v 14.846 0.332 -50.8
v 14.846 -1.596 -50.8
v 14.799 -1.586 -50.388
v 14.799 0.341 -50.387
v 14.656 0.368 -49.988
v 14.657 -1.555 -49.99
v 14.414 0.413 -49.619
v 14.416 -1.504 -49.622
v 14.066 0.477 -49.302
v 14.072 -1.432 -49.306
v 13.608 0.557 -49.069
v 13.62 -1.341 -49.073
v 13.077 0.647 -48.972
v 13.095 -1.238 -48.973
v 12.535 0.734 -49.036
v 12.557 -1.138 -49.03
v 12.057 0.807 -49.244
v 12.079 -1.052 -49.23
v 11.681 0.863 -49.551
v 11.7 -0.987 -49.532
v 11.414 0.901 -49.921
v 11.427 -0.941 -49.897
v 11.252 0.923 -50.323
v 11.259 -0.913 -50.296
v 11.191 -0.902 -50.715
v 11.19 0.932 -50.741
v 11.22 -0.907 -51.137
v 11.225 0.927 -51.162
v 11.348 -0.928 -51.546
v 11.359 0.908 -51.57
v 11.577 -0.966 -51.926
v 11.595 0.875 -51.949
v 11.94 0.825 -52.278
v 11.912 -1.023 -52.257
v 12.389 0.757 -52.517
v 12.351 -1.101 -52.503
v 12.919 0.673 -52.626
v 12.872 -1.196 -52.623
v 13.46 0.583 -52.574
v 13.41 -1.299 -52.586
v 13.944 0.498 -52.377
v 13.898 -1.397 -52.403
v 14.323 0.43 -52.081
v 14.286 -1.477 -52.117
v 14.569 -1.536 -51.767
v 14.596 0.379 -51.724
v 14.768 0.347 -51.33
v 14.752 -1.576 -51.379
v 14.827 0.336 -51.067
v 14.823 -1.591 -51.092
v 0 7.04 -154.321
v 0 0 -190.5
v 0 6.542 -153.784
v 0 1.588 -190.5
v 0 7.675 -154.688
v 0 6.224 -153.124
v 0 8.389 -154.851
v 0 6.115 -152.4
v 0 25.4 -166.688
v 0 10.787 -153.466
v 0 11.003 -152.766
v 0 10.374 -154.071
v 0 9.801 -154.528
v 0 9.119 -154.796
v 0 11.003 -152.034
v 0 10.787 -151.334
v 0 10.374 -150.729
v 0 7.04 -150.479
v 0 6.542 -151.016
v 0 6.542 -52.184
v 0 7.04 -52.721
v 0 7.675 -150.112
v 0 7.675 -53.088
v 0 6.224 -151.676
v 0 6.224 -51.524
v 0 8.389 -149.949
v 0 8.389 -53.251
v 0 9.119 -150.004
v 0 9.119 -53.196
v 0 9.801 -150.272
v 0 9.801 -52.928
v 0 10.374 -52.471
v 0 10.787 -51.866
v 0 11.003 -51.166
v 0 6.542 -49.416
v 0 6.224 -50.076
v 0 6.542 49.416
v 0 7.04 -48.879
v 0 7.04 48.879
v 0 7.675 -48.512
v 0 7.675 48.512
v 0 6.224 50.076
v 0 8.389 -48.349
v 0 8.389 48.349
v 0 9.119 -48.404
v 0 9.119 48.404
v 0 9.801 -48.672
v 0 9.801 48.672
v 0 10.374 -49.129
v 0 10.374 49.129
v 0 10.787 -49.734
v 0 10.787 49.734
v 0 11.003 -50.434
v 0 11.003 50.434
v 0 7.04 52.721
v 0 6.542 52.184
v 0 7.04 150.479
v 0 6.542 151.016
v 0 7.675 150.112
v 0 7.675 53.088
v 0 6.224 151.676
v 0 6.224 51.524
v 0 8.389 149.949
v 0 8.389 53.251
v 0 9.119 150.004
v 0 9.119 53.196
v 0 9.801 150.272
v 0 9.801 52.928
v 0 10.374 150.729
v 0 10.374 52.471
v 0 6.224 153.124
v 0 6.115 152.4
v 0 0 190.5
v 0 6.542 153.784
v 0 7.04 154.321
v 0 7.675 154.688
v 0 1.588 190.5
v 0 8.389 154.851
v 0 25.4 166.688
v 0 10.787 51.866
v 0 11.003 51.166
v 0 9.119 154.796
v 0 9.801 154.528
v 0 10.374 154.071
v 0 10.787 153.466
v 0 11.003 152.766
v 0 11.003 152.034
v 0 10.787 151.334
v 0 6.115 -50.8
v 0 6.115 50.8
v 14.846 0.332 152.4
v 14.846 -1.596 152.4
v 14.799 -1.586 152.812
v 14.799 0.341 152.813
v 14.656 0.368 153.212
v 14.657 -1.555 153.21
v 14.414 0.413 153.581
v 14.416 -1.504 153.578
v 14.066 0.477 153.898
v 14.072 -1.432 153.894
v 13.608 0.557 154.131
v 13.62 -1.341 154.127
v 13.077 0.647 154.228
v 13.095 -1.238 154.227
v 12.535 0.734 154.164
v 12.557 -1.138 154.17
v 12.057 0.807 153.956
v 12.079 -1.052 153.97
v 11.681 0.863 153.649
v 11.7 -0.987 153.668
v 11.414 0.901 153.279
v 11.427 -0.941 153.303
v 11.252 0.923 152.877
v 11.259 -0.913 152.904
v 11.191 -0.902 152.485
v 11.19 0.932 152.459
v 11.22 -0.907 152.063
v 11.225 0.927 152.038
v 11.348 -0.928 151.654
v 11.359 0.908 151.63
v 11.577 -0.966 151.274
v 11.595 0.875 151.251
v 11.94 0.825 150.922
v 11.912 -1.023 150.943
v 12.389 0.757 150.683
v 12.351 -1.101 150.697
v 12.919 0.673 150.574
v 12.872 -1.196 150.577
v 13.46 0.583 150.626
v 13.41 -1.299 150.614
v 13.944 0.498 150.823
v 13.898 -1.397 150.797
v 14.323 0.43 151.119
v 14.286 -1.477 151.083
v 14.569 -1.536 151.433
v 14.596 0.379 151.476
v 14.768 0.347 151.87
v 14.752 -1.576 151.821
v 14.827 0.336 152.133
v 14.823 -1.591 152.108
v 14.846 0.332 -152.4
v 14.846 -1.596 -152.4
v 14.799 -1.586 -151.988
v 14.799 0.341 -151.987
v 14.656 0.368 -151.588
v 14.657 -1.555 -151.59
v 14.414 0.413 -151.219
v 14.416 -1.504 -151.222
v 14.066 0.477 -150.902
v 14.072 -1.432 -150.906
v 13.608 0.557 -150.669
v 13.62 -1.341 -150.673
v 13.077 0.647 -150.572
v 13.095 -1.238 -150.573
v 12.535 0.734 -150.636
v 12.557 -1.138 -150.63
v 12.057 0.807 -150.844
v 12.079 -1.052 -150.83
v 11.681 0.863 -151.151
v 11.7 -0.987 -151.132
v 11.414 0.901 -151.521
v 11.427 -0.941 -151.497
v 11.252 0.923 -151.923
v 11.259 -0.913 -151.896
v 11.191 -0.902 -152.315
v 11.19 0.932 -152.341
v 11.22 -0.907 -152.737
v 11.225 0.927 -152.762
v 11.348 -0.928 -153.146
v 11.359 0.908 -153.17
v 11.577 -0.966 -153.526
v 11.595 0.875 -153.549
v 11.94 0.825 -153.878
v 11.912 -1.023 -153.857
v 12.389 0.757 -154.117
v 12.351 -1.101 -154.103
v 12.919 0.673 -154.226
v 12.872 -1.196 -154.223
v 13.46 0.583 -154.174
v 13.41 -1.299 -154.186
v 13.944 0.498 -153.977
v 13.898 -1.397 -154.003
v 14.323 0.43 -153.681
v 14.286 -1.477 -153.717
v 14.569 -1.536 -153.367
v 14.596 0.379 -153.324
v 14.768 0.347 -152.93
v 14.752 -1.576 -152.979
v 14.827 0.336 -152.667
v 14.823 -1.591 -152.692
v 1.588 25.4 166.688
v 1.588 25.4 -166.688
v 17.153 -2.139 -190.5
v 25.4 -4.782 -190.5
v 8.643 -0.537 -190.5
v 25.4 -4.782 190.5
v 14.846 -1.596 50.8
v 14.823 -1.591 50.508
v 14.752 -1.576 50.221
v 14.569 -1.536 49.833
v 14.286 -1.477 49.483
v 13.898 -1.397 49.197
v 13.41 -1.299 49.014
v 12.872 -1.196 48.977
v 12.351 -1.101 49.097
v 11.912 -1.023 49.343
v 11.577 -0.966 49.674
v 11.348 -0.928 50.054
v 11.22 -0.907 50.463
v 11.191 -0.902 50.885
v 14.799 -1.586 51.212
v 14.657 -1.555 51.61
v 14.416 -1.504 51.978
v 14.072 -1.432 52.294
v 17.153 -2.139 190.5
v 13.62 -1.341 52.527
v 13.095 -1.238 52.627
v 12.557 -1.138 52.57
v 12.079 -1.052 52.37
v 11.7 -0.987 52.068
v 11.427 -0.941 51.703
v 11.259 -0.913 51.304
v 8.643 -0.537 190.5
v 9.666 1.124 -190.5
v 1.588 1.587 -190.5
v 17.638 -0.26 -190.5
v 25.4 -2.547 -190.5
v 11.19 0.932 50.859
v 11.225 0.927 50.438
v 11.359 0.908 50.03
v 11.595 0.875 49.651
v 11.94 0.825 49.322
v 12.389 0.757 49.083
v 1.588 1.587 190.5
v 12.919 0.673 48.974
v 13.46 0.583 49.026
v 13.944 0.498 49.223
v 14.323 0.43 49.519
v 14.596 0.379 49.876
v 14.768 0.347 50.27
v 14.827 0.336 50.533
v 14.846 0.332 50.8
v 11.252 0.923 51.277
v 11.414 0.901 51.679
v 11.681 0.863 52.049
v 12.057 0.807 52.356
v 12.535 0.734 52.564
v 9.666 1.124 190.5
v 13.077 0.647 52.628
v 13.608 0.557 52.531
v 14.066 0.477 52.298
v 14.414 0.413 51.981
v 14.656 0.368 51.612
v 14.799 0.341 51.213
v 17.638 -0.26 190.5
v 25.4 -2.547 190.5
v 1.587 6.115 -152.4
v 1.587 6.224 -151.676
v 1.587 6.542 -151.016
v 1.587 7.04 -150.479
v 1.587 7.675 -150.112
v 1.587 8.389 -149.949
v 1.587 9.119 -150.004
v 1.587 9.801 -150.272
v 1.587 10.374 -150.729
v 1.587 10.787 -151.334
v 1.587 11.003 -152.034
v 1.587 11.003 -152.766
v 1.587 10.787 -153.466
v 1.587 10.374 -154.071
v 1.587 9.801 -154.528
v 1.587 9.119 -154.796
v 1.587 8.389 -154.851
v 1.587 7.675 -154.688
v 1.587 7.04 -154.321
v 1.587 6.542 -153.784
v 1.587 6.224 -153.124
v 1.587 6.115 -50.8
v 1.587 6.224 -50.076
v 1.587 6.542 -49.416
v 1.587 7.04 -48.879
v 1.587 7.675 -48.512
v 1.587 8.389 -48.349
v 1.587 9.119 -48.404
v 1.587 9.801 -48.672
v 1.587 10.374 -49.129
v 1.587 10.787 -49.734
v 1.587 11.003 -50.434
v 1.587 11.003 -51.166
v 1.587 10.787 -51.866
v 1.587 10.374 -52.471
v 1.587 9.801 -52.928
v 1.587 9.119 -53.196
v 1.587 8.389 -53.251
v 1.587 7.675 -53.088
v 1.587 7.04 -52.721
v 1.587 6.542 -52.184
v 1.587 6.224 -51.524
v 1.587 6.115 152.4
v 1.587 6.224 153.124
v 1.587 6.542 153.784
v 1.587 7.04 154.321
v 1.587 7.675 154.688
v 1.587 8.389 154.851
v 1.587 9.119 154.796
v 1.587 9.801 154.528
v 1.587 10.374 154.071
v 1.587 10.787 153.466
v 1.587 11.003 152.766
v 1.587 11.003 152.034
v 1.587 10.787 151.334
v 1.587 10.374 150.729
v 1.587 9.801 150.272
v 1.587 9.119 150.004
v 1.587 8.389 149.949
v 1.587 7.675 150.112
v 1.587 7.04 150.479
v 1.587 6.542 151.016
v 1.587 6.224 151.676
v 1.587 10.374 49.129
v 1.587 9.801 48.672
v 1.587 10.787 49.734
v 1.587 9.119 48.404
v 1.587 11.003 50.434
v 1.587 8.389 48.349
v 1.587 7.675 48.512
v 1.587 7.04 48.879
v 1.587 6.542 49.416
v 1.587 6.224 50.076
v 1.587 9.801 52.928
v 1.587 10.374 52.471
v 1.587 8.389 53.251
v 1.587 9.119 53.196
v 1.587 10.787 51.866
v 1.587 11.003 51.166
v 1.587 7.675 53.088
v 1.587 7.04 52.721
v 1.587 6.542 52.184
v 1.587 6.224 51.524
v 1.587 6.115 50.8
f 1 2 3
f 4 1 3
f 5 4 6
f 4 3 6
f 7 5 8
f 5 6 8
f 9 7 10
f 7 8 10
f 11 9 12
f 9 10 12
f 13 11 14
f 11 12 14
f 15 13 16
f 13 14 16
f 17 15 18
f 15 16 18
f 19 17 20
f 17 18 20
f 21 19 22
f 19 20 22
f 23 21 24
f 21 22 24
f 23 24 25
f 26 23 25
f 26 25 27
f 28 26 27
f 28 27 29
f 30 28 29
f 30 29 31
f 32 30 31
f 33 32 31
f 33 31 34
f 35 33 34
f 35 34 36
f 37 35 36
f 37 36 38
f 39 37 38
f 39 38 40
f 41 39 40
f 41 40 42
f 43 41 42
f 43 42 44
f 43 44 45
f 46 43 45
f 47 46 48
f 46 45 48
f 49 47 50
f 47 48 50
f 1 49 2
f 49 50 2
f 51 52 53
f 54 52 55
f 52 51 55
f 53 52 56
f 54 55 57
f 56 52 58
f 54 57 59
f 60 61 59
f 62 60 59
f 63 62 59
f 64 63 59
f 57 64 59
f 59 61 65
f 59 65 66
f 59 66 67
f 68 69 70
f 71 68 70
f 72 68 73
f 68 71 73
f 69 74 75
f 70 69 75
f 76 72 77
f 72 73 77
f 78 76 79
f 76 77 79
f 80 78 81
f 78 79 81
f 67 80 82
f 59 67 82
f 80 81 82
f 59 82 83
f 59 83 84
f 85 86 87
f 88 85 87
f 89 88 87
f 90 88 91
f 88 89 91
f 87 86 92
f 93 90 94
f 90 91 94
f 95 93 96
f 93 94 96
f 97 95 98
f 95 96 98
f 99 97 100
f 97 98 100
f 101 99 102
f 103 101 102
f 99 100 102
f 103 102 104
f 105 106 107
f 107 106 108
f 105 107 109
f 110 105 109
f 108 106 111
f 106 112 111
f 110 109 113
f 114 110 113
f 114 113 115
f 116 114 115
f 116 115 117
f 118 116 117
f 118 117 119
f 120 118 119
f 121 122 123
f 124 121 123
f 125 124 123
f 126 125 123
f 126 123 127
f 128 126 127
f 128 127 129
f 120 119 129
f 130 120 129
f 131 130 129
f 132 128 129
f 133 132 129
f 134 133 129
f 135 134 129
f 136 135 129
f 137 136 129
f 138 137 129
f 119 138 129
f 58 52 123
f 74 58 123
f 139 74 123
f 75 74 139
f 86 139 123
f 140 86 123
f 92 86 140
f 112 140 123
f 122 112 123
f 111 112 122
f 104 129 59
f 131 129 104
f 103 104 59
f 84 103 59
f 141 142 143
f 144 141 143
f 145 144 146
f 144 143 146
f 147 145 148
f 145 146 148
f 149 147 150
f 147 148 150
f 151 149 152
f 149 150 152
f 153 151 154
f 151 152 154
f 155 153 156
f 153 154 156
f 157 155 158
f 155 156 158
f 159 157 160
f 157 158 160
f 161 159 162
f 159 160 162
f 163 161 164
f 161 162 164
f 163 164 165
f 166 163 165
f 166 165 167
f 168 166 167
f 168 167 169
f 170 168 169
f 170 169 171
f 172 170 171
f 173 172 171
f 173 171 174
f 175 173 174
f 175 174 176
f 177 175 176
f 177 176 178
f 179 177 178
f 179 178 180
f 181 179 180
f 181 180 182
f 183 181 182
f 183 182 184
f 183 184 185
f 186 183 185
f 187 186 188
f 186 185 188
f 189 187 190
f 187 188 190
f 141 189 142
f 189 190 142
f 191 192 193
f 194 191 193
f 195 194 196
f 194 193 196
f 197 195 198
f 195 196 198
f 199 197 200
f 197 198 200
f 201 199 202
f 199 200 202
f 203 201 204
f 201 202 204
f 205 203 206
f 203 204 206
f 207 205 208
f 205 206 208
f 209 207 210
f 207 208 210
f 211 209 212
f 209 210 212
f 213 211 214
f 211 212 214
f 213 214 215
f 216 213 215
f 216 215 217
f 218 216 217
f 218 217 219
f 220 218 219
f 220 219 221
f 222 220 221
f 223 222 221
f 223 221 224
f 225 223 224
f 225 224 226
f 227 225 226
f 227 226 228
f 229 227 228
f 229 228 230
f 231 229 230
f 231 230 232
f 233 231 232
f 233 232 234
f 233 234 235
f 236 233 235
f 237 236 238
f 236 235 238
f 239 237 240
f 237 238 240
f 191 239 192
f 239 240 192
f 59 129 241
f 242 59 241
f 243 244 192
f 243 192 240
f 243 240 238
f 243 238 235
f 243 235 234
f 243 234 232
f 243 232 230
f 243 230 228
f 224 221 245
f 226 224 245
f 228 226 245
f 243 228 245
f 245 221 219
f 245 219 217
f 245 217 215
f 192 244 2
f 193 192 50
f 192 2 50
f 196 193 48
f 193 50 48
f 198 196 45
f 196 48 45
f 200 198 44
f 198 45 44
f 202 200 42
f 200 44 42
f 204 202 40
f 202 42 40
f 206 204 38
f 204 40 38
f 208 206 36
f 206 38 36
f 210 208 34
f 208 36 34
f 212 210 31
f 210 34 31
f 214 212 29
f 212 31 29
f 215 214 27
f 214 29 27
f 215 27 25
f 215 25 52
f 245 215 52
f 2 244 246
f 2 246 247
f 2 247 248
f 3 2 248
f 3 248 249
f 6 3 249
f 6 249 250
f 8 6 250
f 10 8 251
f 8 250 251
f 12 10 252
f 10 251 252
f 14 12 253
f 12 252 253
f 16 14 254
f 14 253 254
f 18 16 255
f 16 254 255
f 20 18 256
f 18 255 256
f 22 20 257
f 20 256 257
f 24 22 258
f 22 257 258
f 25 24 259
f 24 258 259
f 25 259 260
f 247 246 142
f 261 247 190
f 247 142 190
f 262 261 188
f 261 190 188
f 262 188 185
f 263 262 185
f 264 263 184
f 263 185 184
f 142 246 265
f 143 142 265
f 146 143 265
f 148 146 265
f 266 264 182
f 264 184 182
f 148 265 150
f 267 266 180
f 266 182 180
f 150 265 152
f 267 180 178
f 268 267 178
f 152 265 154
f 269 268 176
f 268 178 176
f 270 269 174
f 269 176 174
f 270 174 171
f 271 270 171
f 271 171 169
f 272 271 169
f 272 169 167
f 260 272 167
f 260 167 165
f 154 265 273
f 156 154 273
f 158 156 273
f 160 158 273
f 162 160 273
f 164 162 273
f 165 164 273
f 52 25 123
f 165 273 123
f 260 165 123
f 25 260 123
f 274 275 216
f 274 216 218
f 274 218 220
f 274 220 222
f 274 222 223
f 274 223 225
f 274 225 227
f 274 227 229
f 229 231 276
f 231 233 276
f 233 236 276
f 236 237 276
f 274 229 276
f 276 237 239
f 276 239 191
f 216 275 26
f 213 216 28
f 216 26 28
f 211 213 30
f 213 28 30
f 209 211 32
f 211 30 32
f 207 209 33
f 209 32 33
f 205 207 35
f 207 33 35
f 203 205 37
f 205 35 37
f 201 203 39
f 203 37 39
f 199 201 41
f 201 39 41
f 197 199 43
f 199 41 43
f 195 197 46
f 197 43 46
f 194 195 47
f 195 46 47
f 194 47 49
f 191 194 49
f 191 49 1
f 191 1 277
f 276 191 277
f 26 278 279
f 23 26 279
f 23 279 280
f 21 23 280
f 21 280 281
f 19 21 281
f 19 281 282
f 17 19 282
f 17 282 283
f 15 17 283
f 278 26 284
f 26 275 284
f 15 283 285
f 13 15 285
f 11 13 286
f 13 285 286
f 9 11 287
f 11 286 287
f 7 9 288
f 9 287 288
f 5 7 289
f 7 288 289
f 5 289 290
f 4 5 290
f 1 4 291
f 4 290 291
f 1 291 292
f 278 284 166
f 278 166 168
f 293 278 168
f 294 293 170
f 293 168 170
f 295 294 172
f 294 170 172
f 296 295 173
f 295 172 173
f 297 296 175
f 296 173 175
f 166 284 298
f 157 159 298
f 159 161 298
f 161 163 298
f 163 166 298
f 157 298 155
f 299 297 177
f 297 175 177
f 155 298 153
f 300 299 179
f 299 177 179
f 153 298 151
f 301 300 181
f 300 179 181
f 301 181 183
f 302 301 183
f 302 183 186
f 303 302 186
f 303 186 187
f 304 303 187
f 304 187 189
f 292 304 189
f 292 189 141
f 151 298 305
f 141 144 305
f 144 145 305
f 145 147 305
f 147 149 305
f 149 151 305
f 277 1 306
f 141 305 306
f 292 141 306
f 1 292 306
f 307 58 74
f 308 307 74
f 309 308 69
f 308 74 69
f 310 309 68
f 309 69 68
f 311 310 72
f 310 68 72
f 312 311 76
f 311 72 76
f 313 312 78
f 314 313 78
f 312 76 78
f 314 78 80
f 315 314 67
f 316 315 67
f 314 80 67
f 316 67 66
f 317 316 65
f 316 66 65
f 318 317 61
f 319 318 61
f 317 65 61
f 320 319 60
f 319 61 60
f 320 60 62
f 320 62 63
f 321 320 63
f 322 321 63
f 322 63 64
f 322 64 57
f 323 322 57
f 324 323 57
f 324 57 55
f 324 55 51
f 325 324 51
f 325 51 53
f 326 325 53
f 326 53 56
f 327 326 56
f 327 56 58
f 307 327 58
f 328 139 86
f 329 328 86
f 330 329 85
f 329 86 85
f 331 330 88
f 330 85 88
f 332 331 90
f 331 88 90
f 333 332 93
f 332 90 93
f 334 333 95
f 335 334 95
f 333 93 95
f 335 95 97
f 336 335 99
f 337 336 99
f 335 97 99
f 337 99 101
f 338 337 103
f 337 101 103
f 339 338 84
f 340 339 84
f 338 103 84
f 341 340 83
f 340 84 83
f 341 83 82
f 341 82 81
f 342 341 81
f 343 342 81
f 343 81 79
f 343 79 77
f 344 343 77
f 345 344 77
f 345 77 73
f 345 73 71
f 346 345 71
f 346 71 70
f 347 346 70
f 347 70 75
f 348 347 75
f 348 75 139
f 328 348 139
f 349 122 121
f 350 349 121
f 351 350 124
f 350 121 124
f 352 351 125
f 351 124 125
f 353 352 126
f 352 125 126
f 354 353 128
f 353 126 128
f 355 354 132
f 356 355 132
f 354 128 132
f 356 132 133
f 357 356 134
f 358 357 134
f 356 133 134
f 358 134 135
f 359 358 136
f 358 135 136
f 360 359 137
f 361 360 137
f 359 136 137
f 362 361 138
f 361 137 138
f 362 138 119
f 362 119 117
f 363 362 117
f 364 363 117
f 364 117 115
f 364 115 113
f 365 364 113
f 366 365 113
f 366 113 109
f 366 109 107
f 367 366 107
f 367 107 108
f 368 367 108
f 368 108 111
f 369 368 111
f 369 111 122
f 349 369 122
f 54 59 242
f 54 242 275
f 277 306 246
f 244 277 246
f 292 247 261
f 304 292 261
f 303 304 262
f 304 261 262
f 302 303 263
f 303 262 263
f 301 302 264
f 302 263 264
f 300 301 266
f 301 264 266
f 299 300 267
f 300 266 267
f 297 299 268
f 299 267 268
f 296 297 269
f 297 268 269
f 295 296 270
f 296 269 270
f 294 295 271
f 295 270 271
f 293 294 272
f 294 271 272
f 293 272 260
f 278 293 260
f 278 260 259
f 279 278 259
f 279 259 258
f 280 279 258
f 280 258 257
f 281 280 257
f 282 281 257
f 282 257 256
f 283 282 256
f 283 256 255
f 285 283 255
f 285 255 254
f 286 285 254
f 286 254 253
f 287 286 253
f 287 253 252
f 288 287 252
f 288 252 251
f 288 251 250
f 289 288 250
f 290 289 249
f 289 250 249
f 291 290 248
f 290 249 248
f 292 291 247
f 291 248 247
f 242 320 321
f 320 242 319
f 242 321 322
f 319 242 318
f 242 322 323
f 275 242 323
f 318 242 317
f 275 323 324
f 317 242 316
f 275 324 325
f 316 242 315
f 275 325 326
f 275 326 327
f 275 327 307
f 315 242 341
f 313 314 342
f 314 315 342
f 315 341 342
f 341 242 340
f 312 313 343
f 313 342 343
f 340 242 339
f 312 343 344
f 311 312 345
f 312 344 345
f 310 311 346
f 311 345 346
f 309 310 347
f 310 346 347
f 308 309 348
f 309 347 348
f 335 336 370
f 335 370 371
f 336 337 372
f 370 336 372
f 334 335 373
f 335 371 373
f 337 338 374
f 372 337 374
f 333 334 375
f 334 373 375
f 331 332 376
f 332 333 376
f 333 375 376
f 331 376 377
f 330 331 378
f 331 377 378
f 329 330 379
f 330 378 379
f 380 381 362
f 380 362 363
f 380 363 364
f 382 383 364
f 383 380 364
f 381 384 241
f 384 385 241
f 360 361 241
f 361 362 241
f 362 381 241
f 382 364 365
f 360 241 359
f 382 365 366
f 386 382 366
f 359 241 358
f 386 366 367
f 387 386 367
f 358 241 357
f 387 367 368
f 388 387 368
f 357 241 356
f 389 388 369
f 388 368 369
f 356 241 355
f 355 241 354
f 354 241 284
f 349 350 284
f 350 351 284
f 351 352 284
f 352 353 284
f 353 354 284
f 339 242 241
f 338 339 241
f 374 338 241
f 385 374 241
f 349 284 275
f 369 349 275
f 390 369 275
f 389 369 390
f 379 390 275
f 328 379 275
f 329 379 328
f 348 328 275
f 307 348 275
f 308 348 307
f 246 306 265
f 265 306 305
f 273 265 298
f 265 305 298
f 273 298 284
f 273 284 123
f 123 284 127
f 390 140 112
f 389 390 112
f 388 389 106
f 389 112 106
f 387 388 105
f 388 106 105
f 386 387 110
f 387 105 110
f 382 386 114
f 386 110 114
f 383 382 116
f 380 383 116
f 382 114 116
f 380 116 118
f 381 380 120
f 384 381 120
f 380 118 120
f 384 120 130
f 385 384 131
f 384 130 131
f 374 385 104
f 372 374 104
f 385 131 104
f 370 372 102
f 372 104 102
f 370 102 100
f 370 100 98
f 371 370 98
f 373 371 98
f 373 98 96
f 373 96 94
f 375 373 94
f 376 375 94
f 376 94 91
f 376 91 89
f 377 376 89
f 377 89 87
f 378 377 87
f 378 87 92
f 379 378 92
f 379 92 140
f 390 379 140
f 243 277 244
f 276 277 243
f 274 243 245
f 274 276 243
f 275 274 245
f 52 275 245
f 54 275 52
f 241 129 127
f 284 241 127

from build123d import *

# Parameters (mm, degrees)
EXTRUDE1_DEPTH               = 190.5
EXTRUDE2_DEPTH               = 387.35
F_6_CLEARANCE_HOLE1_D        = 3.6576
F_10_0_1935_DIAMETER_HOLE1_D = 4.9149
LPATTERN1_COUNT              = 3
LPATTERN1_PITCH              = 101.6
LPATTERN1_COL_COUNT          = 2
LPATTERN1_COL_PITCH          = 101.6


with BuildPart() as part:
    # Sketch1 → Extrude1 (new, symmetric)
    with BuildSketch(Plane.XY):
        with BuildLine():
            Line((0, 0), (0, 25.4))
            Line((0, 25.4), (1.5875, 25.4))
            Line((1.5875, 25.4), (1.5875, 1.5875))
            ThreePointArc((1.5875, 1.5875), (13.671867582, 0.546246178), (25.4, -2.546820159))
            Line((25.4, -2.546820159), (25.4, -4.781862636))
            ThreePointArc((25.4, -4.781862636), (12.923101507, -1.205874633), (0, 0))
        make_face()
    extrude(amount=EXTRUDE1_DEPTH, both=True)

    # Sketch2 → Extrude2 (cut)
    with BuildSketch(Plane.ZY):
        Polygon((190.5, 25.4), (166.6875, 25.4), (190.5, 1.5875), align=None)
    extrude2 = extrude(amount=-EXTRUDE2_DEPTH, mode=Mode.SUBTRACT)

    # Mirror2: Extrude2 across plane
    add(extrude2.mirror(Plane(origin=(0, 0, 0), x_dir=(1, 0, 0), z_dir=(0, 0, -1))), mode=Mode.SUBTRACT)

    # #6 Clearance Hole1 (through all)
    with Locations(Plane(origin=(0, 1.5875, 0), x_dir=(-1, 0, 0), z_dir=(0, 1, 0))):
        with Locations((-13.0175, -50.8)):
            f_6_clearance_hole1 = Hole(F_6_CLEARANCE_HOLE1_D / 2)

    # #10 (0.1935) Diameter Hole1 (through all)
    with Locations(Plane(origin=(1.5875, 8.5725, -50.8), x_dir=(0, 1, 0), z_dir=(1, 0, 0))):
        with Locations((0, 0)):
            f_10_0_1935_diameter_hole1 = Hole(F_10_0_1935_DIAMETER_HOLE1_D / 2)

    # LPattern1: #6 Clearance Hole1, #10 (0.1935) Diameter Hole1 ×3
    with Locations(*[(0, 0, i * LPATTERN1_PITCH) for i in range(1, LPATTERN1_COUNT)]):
        add(f_6_clearance_hole1, mode=Mode.SUBTRACT)
        add(f_10_0_1935_diameter_hole1, mode=Mode.SUBTRACT)

    # LPattern1 col: #6 Clearance Hole1, #10 (0.1935) Diameter Hole1 ×2
    with Locations(*[(0, 0, -i * LPATTERN1_COL_PITCH) for i in range(1, LPATTERN1_COL_COUNT)]):
        add(f_6_clearance_hole1, mode=Mode.SUBTRACT)
        add(f_10_0_1935_diameter_hole1, mode=Mode.SUBTRACT)


solid = part.part
